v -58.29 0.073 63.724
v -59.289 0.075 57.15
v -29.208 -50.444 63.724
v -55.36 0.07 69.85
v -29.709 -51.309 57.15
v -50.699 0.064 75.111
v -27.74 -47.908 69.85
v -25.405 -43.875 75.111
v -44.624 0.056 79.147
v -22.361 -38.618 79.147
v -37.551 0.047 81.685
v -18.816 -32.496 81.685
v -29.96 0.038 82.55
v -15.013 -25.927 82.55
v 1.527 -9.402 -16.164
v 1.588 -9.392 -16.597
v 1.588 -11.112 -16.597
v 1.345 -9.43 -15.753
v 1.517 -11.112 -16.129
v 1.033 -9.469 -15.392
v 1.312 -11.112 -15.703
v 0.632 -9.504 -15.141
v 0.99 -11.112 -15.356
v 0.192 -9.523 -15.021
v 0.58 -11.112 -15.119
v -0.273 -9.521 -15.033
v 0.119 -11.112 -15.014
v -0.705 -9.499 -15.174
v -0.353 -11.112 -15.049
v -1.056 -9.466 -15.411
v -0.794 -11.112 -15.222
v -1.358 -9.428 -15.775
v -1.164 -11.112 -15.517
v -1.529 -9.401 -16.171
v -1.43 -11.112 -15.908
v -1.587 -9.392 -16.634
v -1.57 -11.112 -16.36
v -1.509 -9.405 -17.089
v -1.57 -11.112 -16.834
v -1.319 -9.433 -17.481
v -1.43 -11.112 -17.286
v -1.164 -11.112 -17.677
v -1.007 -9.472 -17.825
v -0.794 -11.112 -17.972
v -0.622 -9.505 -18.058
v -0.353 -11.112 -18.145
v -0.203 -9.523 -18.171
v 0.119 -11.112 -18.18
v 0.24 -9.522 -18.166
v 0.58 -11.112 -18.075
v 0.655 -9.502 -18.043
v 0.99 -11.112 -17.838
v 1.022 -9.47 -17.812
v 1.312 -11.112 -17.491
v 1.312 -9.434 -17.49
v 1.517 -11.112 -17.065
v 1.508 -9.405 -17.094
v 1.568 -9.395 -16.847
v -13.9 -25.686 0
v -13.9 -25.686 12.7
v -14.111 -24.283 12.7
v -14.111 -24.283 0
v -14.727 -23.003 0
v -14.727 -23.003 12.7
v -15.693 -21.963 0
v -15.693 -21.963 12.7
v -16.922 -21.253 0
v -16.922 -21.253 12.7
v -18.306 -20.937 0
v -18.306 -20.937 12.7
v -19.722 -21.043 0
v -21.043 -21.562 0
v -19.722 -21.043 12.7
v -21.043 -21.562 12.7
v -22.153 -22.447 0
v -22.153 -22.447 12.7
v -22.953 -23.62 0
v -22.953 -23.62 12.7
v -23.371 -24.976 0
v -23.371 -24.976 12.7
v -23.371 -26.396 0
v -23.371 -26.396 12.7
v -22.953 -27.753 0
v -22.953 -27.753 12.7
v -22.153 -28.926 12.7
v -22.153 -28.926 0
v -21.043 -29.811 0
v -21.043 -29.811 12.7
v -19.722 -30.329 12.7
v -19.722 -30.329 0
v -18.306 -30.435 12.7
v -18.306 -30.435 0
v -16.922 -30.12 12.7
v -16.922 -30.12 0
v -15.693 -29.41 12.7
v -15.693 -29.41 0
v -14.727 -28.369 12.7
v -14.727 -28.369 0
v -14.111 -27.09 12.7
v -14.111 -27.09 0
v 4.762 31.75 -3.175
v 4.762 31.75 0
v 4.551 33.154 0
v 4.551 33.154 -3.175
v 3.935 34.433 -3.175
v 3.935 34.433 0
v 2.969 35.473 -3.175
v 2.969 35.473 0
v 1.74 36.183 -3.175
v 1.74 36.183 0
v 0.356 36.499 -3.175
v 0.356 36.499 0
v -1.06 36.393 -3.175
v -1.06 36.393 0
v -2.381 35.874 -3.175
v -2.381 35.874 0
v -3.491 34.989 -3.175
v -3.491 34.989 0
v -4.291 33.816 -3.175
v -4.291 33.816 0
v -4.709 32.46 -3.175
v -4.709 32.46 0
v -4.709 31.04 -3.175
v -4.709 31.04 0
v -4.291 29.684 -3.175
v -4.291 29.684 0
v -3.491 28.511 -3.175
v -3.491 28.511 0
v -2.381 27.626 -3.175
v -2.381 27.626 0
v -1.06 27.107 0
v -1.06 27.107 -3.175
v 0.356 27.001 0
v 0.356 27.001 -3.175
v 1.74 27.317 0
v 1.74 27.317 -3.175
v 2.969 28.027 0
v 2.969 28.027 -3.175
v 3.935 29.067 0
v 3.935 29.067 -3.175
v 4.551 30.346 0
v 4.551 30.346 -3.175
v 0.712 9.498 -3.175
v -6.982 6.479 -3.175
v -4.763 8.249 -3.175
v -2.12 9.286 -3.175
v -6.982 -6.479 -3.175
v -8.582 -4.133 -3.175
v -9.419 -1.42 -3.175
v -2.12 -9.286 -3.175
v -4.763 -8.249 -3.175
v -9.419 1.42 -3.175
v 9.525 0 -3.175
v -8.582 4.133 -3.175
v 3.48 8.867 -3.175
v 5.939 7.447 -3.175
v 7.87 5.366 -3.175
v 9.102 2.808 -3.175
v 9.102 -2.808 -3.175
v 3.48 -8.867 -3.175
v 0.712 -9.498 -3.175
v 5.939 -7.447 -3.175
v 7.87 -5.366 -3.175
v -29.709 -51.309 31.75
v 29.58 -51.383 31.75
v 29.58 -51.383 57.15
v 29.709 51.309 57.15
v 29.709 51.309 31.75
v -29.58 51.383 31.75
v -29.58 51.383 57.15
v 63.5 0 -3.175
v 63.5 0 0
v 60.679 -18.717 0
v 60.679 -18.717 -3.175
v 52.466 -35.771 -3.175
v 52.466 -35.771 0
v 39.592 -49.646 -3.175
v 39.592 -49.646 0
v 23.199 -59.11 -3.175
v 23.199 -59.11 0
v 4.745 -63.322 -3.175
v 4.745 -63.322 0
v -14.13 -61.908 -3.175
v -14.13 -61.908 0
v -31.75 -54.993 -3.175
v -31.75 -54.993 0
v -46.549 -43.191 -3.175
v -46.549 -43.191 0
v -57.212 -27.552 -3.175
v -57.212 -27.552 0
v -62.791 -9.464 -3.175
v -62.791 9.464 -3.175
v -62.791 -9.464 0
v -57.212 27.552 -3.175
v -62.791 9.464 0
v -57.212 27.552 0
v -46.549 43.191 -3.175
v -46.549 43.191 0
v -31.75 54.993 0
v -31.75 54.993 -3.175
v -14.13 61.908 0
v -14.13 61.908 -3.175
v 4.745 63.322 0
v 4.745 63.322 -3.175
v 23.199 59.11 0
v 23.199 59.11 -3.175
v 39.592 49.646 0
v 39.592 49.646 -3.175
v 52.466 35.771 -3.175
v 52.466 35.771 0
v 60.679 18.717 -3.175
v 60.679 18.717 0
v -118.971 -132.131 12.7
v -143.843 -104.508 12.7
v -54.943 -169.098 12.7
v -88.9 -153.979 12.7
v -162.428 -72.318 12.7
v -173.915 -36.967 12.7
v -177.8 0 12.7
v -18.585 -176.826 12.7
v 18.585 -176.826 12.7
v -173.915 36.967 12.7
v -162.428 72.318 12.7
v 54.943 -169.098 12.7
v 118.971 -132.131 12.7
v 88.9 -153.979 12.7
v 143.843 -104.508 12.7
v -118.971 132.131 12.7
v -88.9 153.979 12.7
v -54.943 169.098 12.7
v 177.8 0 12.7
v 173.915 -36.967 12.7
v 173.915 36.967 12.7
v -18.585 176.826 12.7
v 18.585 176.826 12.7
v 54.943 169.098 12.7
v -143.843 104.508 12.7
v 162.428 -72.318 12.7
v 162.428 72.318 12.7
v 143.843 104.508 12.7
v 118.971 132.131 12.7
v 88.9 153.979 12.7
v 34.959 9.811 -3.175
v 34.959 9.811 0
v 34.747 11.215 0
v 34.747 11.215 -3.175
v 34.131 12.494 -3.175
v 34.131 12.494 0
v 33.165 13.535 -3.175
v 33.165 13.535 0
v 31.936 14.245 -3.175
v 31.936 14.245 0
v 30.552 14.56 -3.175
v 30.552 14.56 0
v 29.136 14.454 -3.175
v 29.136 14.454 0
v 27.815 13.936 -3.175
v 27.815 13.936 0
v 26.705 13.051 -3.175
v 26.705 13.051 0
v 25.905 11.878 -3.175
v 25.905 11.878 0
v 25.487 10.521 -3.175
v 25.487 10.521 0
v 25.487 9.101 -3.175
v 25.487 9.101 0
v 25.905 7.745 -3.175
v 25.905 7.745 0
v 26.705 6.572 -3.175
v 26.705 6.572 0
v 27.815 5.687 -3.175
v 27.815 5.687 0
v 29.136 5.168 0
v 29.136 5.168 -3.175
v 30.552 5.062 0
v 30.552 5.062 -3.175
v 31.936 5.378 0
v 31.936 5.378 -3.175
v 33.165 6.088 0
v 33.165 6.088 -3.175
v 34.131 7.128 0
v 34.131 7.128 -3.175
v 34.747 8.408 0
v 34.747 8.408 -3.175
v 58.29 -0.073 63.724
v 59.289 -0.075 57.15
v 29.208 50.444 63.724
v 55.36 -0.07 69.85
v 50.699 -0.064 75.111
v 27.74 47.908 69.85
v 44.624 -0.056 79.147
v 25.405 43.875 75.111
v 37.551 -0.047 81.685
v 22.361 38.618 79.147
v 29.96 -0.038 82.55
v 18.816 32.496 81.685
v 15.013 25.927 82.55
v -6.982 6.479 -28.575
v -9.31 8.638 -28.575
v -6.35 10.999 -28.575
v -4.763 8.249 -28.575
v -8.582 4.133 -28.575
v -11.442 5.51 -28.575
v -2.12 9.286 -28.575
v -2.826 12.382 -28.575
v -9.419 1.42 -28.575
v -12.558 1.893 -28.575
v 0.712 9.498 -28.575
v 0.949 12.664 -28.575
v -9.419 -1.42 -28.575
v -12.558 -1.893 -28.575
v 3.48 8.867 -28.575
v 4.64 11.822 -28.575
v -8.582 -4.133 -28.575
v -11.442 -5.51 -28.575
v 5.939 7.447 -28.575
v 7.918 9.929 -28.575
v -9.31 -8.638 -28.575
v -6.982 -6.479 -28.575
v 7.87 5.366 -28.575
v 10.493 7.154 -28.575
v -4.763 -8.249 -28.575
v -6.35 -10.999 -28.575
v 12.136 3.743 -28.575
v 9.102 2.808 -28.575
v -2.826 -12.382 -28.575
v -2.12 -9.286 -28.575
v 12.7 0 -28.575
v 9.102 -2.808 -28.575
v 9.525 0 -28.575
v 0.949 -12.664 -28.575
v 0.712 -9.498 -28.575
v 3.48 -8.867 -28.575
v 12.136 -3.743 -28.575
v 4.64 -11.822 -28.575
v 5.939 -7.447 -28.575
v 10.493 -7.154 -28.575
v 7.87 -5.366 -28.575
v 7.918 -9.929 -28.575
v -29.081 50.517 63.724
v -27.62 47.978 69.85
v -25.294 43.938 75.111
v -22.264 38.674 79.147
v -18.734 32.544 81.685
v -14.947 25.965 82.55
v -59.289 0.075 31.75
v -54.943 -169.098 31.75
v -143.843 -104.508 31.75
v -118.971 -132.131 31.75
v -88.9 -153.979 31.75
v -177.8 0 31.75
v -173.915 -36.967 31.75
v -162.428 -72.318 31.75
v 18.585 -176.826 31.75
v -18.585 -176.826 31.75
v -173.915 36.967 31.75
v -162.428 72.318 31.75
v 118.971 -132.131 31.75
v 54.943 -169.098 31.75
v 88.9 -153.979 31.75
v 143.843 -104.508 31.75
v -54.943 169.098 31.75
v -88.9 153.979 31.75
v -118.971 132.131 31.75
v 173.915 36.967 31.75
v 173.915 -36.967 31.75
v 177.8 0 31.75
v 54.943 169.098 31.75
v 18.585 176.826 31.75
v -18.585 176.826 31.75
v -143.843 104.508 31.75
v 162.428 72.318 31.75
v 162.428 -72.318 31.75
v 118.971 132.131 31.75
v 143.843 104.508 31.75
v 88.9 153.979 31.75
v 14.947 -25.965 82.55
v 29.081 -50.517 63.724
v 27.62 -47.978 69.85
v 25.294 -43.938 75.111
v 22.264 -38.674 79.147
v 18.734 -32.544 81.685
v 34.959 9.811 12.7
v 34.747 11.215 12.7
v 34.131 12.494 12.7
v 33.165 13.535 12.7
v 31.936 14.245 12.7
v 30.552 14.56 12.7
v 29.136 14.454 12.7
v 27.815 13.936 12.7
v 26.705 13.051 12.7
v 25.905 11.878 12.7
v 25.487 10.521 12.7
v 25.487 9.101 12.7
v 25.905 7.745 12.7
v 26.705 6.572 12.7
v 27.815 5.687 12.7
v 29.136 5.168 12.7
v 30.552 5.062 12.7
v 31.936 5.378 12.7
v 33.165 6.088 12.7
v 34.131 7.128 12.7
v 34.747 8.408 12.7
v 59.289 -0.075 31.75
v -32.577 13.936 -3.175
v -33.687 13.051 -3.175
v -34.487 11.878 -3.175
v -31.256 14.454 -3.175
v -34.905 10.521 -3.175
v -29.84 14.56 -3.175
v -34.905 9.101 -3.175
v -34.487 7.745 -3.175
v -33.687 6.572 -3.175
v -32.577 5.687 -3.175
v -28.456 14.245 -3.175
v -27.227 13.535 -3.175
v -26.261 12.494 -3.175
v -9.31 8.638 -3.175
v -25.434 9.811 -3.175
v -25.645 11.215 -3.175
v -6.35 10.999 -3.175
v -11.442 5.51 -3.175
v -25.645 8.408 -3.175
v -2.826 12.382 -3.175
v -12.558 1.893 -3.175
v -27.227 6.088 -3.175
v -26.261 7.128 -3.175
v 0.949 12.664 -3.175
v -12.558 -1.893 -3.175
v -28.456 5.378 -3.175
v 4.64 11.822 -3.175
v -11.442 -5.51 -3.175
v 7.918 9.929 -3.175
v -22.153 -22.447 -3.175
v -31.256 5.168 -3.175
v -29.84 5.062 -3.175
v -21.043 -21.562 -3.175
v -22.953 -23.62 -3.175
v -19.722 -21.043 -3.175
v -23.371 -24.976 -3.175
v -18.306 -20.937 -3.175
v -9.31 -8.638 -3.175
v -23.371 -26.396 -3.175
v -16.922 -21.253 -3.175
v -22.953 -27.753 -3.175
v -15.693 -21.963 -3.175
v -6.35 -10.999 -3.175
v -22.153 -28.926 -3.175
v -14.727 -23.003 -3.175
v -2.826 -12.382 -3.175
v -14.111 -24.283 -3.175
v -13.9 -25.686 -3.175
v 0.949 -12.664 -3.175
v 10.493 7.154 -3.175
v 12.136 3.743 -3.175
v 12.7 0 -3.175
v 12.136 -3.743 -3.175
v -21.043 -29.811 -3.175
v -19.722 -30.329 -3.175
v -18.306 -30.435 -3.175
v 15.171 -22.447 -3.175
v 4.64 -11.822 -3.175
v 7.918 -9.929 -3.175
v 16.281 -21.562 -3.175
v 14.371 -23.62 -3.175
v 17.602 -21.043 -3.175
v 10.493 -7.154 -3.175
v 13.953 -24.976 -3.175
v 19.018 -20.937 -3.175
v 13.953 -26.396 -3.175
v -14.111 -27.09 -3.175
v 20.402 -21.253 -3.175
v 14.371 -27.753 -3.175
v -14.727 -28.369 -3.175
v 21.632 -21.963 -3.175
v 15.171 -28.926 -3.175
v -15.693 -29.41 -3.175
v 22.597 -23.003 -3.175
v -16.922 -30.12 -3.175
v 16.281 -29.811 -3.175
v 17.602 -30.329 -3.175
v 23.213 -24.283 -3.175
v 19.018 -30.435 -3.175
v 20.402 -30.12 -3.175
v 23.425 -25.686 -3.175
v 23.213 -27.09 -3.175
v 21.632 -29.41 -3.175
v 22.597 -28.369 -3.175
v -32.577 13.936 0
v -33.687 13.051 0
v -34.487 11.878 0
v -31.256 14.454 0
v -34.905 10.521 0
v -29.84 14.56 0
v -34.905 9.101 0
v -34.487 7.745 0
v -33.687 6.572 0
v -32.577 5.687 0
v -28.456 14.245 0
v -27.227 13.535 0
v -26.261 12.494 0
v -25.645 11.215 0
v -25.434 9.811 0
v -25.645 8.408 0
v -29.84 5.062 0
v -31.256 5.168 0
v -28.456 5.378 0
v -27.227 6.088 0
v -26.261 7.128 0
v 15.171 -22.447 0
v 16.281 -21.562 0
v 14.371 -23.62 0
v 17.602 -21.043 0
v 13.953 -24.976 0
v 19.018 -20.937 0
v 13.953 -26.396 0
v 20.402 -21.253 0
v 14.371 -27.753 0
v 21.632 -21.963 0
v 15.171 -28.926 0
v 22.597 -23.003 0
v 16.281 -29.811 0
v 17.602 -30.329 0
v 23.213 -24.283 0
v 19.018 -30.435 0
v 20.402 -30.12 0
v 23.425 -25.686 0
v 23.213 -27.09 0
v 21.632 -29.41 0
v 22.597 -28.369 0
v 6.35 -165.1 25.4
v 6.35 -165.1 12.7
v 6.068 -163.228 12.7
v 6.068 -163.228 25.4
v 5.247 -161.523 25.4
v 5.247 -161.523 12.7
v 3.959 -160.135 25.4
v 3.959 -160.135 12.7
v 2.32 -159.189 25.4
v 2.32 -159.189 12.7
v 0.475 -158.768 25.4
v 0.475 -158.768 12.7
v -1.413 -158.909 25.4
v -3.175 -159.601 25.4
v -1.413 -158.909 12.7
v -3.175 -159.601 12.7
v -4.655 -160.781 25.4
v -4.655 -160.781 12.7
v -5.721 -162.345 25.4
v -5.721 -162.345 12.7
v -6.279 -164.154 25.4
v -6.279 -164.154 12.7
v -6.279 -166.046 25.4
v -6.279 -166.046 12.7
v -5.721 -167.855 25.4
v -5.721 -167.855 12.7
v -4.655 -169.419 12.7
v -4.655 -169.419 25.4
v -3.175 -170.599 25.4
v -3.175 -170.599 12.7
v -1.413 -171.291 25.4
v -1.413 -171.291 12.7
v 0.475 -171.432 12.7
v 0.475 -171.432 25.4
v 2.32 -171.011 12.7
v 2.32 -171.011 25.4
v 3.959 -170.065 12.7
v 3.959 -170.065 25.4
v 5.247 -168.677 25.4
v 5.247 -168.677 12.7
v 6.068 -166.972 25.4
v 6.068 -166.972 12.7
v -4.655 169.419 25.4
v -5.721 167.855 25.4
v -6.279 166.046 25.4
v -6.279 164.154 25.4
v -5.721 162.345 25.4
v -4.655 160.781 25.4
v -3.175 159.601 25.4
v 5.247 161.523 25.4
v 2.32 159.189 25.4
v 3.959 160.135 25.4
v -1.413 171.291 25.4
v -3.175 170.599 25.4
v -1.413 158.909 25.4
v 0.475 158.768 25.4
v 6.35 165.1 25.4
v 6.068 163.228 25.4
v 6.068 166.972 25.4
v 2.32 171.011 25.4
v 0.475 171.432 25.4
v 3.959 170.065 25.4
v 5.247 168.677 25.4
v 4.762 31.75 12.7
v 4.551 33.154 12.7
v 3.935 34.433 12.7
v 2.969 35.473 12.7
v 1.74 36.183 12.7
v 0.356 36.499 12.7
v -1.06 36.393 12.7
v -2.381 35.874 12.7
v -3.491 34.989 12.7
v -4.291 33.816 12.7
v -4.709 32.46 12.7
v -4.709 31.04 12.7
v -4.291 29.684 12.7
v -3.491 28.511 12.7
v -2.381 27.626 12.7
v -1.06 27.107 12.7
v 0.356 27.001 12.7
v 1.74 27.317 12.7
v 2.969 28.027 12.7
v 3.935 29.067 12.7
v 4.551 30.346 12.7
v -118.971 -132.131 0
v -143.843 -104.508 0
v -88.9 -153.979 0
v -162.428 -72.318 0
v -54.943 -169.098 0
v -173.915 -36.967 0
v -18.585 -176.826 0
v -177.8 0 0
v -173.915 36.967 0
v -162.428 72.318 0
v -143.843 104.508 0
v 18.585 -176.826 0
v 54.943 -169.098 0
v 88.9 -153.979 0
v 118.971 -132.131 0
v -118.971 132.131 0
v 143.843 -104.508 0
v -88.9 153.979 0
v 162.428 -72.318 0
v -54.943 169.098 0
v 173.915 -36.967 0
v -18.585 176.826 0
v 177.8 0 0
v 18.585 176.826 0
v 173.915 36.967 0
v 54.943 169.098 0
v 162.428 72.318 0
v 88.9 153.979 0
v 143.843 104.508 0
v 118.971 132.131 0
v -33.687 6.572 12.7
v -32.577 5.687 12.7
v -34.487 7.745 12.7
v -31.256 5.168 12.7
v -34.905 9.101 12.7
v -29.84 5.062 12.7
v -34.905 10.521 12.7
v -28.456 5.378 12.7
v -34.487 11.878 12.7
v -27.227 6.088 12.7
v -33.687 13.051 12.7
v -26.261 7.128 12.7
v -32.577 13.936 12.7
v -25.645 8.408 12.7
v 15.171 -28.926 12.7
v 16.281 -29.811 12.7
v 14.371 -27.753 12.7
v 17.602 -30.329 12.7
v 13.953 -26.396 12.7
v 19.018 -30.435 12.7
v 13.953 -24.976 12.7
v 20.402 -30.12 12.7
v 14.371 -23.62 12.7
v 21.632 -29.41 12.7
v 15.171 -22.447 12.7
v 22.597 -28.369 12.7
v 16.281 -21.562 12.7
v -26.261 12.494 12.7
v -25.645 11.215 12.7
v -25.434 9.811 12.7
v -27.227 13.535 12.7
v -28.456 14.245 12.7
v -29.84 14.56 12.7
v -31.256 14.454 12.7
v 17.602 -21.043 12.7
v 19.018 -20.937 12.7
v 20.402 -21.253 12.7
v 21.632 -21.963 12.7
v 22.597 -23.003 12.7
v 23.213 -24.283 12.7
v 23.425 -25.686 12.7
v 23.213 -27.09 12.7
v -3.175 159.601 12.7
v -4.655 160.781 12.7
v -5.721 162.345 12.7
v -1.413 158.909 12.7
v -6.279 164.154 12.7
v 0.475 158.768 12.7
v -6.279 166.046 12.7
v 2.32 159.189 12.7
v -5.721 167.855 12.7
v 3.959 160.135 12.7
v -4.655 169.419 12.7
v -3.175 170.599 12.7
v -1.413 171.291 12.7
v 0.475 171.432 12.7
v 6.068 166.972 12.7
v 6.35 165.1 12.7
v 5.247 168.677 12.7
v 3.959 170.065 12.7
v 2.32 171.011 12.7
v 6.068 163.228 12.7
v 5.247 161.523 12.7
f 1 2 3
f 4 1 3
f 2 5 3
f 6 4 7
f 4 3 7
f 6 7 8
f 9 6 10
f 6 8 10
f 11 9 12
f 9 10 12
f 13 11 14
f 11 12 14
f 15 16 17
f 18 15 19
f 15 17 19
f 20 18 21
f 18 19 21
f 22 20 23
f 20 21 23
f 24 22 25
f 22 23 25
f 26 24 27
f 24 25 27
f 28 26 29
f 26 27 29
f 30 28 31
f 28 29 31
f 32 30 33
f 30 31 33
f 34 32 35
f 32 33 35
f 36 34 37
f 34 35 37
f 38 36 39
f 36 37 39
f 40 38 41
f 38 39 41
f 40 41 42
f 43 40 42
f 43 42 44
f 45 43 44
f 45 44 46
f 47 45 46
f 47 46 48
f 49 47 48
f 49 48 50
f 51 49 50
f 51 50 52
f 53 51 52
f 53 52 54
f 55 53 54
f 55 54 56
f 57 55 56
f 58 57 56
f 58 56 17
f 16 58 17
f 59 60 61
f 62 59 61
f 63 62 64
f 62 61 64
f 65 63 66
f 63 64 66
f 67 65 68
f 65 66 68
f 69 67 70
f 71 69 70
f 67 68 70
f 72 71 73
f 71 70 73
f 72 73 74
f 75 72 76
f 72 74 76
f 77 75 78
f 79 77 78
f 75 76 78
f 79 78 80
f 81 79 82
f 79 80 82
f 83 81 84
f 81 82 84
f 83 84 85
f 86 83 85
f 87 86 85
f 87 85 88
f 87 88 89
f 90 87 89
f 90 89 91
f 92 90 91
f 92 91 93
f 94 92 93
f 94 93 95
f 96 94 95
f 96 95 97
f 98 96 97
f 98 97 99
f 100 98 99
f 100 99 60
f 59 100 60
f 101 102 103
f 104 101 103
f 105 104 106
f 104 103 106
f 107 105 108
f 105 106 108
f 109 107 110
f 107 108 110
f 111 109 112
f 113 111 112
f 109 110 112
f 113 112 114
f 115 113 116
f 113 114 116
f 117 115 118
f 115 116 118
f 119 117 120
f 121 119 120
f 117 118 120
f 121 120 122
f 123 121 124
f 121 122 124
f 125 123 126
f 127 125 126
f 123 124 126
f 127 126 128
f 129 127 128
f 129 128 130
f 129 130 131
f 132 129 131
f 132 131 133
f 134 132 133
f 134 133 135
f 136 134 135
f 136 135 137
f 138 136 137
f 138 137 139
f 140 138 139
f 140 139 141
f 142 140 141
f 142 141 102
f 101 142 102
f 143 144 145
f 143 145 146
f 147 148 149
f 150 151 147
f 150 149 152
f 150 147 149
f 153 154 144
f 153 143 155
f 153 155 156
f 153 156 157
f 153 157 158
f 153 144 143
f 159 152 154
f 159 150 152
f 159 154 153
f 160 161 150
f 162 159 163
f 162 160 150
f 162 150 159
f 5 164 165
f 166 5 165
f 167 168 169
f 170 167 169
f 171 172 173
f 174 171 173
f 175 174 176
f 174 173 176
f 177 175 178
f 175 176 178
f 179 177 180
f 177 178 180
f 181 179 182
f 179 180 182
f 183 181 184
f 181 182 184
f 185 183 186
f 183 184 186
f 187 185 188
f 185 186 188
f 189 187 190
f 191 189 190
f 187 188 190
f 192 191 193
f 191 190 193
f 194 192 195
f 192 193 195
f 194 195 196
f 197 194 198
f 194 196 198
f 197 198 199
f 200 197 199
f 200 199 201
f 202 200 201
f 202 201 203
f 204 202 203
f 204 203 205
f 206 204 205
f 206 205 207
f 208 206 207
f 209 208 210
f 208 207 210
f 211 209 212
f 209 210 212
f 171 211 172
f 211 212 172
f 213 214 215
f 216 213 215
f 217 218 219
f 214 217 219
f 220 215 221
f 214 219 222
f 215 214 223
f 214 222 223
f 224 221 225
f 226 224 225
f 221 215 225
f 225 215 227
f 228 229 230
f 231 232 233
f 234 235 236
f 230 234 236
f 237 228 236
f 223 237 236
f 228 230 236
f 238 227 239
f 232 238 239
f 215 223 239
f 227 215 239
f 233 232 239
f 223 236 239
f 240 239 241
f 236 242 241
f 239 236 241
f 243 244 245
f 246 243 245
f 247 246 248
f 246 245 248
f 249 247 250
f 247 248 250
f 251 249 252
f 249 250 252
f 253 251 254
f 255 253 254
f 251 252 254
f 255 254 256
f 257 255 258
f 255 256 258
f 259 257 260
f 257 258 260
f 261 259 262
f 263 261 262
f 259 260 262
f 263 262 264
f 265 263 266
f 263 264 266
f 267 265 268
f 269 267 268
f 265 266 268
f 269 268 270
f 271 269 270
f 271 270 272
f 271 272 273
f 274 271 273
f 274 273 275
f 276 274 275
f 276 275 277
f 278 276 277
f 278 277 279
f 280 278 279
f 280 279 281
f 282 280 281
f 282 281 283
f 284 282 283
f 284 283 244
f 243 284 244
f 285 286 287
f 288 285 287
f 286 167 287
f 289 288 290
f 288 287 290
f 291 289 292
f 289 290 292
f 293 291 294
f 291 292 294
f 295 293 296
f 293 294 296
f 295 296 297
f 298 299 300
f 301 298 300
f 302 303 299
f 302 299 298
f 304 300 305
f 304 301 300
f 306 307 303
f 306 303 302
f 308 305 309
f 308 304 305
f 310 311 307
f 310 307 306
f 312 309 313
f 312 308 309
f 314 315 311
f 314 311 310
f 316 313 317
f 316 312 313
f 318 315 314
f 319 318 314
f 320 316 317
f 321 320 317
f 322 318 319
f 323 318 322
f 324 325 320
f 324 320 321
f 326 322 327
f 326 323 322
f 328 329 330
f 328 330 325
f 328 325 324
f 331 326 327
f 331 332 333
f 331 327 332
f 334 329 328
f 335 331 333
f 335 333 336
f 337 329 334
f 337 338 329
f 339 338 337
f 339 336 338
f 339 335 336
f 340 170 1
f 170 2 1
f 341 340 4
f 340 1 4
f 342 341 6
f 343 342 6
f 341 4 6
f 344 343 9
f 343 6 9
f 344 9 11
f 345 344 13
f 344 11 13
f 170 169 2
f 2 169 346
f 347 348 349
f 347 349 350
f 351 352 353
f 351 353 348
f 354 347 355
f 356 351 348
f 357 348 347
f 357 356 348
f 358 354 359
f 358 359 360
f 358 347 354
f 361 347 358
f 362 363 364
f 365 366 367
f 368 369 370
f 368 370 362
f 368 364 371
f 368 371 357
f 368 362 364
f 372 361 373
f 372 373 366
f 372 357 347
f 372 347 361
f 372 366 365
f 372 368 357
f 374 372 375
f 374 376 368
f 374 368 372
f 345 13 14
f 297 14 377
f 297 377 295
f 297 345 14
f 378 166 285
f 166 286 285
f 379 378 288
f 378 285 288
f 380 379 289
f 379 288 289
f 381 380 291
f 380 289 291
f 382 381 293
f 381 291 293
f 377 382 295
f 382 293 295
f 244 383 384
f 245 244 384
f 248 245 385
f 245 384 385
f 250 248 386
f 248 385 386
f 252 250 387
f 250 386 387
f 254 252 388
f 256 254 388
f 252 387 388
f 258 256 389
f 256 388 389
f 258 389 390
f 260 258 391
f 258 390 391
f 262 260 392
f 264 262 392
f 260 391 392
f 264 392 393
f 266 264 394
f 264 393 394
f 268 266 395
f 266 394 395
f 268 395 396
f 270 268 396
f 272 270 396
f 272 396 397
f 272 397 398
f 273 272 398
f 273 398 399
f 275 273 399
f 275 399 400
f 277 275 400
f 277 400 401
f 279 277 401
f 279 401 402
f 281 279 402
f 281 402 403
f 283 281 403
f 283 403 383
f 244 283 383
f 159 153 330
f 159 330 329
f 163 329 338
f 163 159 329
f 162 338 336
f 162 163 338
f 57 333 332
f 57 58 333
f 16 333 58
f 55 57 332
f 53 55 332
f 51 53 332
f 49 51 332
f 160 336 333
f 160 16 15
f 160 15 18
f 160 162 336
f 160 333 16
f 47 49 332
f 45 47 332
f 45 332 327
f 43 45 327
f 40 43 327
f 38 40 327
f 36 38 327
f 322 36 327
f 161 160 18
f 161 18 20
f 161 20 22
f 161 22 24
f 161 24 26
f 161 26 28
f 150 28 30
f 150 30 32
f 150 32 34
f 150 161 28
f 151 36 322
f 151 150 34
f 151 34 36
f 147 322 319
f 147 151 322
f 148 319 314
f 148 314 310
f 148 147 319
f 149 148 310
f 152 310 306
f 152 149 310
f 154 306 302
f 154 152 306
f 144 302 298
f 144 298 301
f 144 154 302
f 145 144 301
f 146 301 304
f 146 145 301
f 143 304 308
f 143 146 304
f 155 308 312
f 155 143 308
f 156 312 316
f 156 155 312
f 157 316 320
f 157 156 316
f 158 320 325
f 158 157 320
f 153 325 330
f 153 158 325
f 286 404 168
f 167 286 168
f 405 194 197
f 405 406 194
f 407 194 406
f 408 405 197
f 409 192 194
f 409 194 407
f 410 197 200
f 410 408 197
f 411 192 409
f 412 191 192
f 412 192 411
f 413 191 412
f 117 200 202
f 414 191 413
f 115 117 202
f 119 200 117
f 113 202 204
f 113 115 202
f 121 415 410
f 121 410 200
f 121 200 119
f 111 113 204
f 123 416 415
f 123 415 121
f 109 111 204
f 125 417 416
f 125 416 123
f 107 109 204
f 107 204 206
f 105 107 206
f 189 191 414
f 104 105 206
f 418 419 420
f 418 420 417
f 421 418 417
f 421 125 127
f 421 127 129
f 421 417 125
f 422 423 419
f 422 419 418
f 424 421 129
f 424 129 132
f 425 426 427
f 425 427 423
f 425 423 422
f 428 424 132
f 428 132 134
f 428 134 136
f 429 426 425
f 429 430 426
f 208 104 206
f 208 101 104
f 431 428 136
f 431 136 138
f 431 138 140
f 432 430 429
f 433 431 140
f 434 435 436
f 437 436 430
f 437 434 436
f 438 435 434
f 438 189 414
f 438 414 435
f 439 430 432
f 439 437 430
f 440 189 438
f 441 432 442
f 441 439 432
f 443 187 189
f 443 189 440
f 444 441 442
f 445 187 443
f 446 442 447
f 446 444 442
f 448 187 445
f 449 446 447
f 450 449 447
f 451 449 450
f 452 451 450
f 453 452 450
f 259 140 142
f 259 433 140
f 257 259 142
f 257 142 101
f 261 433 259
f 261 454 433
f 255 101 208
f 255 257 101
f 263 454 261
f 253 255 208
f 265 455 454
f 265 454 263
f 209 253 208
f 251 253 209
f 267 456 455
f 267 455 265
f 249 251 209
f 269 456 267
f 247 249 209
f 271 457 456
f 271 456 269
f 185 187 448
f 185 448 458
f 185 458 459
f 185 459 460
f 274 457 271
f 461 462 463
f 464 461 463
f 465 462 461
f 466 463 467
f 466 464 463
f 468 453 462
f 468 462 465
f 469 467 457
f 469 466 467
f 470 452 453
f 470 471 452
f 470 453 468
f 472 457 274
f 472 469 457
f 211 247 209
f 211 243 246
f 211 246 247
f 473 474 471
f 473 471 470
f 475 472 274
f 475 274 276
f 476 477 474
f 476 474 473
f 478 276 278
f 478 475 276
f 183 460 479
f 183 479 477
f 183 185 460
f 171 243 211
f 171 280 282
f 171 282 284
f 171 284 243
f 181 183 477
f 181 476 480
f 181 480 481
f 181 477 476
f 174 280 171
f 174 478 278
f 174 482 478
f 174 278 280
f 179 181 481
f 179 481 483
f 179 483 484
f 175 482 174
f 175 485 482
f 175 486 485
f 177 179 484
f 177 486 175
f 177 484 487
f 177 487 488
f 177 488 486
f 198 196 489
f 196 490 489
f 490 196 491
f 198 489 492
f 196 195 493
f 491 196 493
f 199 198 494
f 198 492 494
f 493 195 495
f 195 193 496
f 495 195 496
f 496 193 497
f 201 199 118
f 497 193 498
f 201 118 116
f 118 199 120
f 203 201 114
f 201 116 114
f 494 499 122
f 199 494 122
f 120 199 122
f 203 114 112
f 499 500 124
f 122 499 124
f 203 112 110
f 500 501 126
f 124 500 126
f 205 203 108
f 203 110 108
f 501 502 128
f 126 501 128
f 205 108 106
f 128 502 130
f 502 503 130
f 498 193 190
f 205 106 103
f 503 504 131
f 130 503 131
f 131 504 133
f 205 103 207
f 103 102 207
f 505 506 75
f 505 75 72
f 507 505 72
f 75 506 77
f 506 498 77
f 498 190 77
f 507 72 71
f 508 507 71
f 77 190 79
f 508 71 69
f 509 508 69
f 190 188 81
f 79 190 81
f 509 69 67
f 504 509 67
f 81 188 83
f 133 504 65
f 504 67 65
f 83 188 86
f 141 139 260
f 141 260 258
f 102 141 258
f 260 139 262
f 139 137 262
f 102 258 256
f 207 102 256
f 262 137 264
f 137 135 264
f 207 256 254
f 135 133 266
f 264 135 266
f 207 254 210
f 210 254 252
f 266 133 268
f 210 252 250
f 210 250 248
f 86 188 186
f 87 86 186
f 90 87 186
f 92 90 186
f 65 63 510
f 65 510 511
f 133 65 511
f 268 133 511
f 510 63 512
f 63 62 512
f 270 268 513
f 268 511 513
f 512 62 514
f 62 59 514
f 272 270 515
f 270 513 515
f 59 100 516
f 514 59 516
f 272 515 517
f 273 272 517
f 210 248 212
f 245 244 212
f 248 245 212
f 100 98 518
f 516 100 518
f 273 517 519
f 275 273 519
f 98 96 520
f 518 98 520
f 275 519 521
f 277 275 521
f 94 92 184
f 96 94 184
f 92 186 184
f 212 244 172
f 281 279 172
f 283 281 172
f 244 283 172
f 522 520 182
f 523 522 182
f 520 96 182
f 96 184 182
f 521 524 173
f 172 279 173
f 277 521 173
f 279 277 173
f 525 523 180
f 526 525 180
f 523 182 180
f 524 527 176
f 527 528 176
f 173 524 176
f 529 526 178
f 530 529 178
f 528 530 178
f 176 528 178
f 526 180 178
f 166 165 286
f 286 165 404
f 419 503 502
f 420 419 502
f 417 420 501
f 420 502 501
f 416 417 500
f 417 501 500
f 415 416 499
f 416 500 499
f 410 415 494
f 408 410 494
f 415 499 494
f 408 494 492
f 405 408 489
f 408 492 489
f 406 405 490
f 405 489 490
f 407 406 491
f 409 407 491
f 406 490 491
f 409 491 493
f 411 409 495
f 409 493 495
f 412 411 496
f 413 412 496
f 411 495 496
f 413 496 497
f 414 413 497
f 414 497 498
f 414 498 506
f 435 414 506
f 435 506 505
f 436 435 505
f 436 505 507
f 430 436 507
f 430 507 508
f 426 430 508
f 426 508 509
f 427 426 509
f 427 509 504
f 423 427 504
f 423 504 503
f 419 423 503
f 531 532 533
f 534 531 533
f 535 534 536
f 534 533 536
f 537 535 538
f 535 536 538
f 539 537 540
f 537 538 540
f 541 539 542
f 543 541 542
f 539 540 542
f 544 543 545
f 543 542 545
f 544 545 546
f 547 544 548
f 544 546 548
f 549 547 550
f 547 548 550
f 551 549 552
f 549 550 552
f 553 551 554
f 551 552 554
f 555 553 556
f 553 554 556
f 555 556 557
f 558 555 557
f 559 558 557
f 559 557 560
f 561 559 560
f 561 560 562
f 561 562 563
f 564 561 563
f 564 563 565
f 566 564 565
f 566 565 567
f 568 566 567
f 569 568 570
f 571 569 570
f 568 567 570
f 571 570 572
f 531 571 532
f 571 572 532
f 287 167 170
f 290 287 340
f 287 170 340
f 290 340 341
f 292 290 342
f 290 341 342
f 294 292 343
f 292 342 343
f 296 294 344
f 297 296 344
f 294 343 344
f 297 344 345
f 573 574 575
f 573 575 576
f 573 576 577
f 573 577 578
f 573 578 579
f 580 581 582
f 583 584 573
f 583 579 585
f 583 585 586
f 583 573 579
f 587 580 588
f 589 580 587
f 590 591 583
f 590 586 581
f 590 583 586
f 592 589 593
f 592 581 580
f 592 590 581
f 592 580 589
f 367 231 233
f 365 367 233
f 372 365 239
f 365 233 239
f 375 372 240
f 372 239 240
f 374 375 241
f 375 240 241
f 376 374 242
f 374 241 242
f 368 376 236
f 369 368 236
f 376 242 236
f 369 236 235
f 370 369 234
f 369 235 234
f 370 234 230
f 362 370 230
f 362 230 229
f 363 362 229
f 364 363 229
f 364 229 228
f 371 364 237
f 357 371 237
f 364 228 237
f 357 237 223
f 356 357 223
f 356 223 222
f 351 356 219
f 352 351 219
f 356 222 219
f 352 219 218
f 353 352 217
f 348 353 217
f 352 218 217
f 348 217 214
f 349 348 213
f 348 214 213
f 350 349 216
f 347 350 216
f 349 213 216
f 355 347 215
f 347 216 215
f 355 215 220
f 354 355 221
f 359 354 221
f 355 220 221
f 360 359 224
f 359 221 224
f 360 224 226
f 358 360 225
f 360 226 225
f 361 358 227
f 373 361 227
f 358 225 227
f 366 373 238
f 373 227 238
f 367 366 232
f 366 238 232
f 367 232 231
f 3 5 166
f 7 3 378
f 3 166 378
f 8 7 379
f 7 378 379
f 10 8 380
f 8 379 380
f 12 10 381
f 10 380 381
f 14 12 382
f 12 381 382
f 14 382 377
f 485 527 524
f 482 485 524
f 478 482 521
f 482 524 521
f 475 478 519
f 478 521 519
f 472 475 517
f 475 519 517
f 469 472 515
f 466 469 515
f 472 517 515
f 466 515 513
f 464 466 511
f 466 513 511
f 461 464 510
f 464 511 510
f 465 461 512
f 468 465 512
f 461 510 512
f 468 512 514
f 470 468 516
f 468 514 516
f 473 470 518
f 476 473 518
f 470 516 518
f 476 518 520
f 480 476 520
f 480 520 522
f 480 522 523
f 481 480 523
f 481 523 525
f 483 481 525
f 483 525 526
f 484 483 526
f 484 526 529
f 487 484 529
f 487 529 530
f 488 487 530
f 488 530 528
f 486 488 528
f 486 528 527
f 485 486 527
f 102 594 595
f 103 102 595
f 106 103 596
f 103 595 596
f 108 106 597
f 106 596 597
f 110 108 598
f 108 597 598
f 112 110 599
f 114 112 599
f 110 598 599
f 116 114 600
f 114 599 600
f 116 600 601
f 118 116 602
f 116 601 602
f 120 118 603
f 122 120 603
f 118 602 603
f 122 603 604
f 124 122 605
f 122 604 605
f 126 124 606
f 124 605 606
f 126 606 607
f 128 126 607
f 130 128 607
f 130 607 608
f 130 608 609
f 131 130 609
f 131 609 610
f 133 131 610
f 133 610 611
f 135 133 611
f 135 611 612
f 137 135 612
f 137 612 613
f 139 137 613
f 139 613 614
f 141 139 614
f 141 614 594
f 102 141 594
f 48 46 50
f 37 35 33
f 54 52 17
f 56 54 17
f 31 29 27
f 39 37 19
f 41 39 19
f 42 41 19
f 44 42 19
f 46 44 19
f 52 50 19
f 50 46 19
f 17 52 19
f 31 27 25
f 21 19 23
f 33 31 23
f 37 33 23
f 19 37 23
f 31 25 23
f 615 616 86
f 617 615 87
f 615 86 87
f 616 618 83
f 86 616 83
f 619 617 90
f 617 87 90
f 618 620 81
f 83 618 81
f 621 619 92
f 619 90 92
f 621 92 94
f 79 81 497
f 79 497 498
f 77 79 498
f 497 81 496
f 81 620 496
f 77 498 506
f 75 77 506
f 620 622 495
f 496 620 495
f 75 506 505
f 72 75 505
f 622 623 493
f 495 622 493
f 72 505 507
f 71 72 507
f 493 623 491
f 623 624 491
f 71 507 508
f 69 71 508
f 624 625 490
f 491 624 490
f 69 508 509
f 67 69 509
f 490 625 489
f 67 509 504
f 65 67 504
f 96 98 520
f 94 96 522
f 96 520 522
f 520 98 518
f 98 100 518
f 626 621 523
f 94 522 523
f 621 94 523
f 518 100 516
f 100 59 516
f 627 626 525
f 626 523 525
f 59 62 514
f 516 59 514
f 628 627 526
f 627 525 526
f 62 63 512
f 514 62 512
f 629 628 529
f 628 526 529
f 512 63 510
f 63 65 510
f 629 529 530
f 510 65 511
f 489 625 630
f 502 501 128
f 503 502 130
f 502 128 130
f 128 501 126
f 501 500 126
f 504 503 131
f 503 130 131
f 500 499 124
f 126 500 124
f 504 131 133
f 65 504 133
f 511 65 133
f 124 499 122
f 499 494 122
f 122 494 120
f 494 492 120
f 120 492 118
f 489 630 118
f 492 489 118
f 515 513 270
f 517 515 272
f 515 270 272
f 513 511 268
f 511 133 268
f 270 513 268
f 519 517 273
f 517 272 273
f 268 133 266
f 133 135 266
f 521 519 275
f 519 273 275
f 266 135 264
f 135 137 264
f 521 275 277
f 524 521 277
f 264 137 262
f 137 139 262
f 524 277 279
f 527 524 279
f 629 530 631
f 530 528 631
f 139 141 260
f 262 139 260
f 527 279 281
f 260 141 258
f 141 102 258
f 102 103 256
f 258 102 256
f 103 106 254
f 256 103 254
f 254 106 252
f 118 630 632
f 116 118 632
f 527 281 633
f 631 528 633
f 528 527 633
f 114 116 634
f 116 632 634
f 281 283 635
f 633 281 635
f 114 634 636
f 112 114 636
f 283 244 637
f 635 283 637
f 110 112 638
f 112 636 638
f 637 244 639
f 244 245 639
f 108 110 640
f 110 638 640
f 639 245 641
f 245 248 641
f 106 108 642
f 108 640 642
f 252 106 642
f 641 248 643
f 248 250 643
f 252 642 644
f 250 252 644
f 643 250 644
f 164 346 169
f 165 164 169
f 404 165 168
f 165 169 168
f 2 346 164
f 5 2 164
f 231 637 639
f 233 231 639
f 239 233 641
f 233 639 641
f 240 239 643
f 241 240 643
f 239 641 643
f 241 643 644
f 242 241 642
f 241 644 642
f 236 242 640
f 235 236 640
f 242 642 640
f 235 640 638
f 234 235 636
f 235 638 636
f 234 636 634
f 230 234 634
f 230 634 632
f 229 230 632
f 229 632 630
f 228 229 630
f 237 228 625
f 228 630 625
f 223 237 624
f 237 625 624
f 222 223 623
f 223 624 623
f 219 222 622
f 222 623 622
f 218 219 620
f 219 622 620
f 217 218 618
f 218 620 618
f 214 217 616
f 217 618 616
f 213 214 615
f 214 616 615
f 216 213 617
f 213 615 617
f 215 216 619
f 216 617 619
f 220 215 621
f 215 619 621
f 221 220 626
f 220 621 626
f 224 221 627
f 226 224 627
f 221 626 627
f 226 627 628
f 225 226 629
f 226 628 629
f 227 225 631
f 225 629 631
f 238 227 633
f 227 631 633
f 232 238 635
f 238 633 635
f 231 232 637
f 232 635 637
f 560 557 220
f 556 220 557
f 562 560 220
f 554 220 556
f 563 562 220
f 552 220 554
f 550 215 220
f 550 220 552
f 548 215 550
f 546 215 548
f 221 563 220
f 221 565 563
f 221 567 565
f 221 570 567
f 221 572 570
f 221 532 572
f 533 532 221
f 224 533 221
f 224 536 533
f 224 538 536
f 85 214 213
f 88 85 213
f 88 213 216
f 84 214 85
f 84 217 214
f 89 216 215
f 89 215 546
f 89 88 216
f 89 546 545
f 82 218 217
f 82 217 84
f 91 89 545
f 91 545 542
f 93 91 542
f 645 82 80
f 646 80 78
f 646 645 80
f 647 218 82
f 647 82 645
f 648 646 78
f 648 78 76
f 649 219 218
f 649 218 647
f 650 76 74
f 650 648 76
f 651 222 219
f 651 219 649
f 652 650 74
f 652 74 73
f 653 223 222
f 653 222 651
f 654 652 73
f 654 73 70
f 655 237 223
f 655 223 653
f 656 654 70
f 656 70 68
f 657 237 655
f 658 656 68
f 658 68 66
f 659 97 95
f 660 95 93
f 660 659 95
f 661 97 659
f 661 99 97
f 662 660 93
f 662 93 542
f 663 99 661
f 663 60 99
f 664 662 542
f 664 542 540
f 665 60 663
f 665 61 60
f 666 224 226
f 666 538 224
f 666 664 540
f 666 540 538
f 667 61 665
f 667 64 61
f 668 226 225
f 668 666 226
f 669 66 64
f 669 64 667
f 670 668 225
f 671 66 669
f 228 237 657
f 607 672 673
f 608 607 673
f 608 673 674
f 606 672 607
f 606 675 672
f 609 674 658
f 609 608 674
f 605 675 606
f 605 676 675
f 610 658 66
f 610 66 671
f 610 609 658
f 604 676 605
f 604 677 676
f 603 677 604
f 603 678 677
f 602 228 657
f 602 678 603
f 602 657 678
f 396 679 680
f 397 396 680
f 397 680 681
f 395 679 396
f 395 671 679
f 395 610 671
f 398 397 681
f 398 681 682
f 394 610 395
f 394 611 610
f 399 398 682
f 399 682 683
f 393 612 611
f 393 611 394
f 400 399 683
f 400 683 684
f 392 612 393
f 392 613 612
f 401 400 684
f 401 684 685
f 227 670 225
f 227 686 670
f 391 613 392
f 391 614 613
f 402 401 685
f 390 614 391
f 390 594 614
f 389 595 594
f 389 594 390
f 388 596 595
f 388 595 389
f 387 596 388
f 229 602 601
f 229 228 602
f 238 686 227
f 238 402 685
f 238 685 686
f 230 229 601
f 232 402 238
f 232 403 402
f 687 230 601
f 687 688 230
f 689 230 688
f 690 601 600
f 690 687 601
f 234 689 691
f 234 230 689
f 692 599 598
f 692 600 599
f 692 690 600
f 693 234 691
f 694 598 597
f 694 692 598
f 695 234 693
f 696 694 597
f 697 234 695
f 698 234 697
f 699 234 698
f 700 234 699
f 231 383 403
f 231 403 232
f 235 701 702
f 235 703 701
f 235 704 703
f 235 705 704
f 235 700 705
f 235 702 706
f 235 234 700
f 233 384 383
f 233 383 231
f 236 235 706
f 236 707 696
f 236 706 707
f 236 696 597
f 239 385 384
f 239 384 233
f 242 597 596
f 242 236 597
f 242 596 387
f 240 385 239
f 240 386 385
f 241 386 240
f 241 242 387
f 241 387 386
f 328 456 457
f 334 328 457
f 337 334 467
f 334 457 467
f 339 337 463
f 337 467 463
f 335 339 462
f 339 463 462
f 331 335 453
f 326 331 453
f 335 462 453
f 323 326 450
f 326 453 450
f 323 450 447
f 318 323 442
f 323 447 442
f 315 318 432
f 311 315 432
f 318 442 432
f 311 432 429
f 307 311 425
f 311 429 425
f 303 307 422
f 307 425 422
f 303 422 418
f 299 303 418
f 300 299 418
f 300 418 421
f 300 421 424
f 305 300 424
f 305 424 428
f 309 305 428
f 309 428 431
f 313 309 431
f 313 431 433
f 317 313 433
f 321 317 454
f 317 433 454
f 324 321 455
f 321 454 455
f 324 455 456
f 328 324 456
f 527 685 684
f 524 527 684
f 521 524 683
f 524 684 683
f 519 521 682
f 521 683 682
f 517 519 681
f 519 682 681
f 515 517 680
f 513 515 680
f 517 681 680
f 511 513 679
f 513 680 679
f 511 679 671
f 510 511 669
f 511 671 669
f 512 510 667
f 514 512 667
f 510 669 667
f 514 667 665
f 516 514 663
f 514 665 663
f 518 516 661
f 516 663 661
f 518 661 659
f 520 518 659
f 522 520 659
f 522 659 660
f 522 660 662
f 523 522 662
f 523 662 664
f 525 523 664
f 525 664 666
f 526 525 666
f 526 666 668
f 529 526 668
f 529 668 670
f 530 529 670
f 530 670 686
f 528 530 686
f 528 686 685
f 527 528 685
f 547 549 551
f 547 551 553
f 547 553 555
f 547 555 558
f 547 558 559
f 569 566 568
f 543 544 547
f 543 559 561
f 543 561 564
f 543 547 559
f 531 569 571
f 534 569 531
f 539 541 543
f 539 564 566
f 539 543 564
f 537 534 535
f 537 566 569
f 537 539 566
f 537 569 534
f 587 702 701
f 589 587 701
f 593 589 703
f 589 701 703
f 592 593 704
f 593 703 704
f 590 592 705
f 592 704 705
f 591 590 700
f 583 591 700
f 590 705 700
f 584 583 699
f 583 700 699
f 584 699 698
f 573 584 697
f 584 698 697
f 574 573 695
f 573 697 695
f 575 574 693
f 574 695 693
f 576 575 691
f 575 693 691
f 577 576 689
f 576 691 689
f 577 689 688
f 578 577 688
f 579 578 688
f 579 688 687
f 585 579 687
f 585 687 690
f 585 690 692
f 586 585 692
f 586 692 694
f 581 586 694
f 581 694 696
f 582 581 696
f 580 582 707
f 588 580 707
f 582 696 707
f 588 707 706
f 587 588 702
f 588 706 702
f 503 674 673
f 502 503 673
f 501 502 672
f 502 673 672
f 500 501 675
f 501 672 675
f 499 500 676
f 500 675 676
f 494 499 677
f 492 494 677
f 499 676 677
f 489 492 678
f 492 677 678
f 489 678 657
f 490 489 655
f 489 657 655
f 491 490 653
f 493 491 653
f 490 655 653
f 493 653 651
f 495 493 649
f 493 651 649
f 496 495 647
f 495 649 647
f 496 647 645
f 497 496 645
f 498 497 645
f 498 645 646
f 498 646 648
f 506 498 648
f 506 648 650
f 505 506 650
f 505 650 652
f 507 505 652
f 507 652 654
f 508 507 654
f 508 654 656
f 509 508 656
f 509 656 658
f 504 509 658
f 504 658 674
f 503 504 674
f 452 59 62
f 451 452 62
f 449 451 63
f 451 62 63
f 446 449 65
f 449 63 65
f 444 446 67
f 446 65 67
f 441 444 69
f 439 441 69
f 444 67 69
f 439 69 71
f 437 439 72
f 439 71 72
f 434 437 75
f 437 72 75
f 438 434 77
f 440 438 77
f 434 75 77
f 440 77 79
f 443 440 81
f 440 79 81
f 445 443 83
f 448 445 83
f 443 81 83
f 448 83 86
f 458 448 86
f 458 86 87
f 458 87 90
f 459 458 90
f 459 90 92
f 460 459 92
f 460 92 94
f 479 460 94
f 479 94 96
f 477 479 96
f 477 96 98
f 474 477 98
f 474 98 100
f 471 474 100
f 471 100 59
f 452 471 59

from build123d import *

# Parameters (mm, degrees)
F0_R      = 177.8
F1_DEPTH  = 12.7
F3_R      = 6.35
F4_DEPTH  = 12.7
F5_R      = 177.8
F6_DEPTH  = 19.05
F7_R      = 63.5
F8_DEPTH  = 3.175
F2_R      = 4.7625
F9_DEPTH  = 15.876
F10_R     = 12.7
F10_R_2   = 9.525
F11_DEPTH = 25.4
F13_R     = 1.5875
F14_DEPTH = 1.7217234466
F16_DEPTH = 50.8
F17_R     = 25.4


with BuildPart() as f1:
    # F0 (on Top) → F1 (new body)
    with BuildSketch(Plane.XY):
        Circle(F0_R)
    extrude(amount=F1_DEPTH)

    # F3 (on face) → F4 (join)
    with BuildSketch(Plane.XY.offset(12.7)):
        with Locations((0, 165.1)):
            Circle(F3_R)
        with Locations((0, -165.1)):
            Circle(F3_R)
    extrude(amount=F4_DEPTH)


with BuildPart() as f6:
    # F5 (on face) → F6 (new body)
    with BuildSketch(Plane.XY.offset(12.7)):
        Circle(F5_R)
    extrude(amount=F6_DEPTH)


with BuildPart() as f8:
    # F7 (on face) → F8 (new body)
    with BuildSketch(Plane(origin=(0, 0, 0), x_dir=(1, 0, 0), z_dir=(0, 0, -1))):
        Circle(F7_R)
    extrude(amount=F8_DEPTH)


with BuildPart() as f9_tool:
    # F2 (on face) → F9 (new body, through all)
    with BuildSketch(Plane.XY.offset(12.7)):
        with Locations((0, 31.75)):
            Circle(F2_R)
        with Locations((-30.1960443924, 9.8112895714)):
            Circle(F2_R)
        with Locations((-18.6621817603, -25.6862895714)):
            Circle(F2_R)
        with Locations((18.6621817603, -25.6862895714)):
            Circle(F2_R)
        with Locations((30.1960443924, 9.8112895714)):
            Circle(F2_R)
    extrude(amount=-F9_DEPTH)


with BuildPart() as f1_1:
    add(f1.part)

    # F9: cut by f9_tool
    add(f9_tool.part, mode=Mode.SUBTRACT)


with BuildPart() as f8_1:
    add(f8.part)

    # F9: cut by f9_tool
    add(f9_tool.part, mode=Mode.SUBTRACT)

    # F10 (on face) → F11 (join)
    with BuildSketch(Plane(origin=(0, 0, -3.175), x_dir=(1, 0, 0), z_dir=(0, 0, -1))):
        Circle(F10_R)
        Circle(F10_R_2, mode=Mode.SUBTRACT)
    extrude(amount=F11_DEPTH)

    # F13 (on offset) → F14 (cut, through all)
    with BuildSketch(Plane.XZ.offset(11.1125)):
        with Locations((0, -16.5969933962)):
            Circle(F13_R)
    extrude(amount=-F14_DEPTH, mode=Mode.SUBTRACT)


with BuildPart() as f16:
    # F15 (on face) → F16 (new body)
    with BuildSketch(Plane.XY.offset(31.75)):
        Polygon((29.5799792173, -51.383216395), (59.2891603349, -0.074594752), (29.7091811176, 51.3086216431), (-29.5799792173, 51.383216395), (-59.2891603349, 0.074594752), (-29.7091811176, -51.3086216431), align=None)
    extrude(amount=F16_DEPTH)

    # F17
    f17_edges = [f16.edges().sort_by_distance(p)[0] for p in [
        (-44.499171, -25.617013, 82.55),
        (0.064601, 51.345919, 82.55),
        (-44.43457, 25.728906, 82.55),
        (44.499171, 25.617013, 82.55),
        (44.43457, -25.728906, 82.55),
        (-0.064601, -51.345919, 82.55),
    ]]
    fillet(f17_edges, radius=F17_R)


solid = Compound([f6.part, f1_1.part, f8_1.part, f16.part])
